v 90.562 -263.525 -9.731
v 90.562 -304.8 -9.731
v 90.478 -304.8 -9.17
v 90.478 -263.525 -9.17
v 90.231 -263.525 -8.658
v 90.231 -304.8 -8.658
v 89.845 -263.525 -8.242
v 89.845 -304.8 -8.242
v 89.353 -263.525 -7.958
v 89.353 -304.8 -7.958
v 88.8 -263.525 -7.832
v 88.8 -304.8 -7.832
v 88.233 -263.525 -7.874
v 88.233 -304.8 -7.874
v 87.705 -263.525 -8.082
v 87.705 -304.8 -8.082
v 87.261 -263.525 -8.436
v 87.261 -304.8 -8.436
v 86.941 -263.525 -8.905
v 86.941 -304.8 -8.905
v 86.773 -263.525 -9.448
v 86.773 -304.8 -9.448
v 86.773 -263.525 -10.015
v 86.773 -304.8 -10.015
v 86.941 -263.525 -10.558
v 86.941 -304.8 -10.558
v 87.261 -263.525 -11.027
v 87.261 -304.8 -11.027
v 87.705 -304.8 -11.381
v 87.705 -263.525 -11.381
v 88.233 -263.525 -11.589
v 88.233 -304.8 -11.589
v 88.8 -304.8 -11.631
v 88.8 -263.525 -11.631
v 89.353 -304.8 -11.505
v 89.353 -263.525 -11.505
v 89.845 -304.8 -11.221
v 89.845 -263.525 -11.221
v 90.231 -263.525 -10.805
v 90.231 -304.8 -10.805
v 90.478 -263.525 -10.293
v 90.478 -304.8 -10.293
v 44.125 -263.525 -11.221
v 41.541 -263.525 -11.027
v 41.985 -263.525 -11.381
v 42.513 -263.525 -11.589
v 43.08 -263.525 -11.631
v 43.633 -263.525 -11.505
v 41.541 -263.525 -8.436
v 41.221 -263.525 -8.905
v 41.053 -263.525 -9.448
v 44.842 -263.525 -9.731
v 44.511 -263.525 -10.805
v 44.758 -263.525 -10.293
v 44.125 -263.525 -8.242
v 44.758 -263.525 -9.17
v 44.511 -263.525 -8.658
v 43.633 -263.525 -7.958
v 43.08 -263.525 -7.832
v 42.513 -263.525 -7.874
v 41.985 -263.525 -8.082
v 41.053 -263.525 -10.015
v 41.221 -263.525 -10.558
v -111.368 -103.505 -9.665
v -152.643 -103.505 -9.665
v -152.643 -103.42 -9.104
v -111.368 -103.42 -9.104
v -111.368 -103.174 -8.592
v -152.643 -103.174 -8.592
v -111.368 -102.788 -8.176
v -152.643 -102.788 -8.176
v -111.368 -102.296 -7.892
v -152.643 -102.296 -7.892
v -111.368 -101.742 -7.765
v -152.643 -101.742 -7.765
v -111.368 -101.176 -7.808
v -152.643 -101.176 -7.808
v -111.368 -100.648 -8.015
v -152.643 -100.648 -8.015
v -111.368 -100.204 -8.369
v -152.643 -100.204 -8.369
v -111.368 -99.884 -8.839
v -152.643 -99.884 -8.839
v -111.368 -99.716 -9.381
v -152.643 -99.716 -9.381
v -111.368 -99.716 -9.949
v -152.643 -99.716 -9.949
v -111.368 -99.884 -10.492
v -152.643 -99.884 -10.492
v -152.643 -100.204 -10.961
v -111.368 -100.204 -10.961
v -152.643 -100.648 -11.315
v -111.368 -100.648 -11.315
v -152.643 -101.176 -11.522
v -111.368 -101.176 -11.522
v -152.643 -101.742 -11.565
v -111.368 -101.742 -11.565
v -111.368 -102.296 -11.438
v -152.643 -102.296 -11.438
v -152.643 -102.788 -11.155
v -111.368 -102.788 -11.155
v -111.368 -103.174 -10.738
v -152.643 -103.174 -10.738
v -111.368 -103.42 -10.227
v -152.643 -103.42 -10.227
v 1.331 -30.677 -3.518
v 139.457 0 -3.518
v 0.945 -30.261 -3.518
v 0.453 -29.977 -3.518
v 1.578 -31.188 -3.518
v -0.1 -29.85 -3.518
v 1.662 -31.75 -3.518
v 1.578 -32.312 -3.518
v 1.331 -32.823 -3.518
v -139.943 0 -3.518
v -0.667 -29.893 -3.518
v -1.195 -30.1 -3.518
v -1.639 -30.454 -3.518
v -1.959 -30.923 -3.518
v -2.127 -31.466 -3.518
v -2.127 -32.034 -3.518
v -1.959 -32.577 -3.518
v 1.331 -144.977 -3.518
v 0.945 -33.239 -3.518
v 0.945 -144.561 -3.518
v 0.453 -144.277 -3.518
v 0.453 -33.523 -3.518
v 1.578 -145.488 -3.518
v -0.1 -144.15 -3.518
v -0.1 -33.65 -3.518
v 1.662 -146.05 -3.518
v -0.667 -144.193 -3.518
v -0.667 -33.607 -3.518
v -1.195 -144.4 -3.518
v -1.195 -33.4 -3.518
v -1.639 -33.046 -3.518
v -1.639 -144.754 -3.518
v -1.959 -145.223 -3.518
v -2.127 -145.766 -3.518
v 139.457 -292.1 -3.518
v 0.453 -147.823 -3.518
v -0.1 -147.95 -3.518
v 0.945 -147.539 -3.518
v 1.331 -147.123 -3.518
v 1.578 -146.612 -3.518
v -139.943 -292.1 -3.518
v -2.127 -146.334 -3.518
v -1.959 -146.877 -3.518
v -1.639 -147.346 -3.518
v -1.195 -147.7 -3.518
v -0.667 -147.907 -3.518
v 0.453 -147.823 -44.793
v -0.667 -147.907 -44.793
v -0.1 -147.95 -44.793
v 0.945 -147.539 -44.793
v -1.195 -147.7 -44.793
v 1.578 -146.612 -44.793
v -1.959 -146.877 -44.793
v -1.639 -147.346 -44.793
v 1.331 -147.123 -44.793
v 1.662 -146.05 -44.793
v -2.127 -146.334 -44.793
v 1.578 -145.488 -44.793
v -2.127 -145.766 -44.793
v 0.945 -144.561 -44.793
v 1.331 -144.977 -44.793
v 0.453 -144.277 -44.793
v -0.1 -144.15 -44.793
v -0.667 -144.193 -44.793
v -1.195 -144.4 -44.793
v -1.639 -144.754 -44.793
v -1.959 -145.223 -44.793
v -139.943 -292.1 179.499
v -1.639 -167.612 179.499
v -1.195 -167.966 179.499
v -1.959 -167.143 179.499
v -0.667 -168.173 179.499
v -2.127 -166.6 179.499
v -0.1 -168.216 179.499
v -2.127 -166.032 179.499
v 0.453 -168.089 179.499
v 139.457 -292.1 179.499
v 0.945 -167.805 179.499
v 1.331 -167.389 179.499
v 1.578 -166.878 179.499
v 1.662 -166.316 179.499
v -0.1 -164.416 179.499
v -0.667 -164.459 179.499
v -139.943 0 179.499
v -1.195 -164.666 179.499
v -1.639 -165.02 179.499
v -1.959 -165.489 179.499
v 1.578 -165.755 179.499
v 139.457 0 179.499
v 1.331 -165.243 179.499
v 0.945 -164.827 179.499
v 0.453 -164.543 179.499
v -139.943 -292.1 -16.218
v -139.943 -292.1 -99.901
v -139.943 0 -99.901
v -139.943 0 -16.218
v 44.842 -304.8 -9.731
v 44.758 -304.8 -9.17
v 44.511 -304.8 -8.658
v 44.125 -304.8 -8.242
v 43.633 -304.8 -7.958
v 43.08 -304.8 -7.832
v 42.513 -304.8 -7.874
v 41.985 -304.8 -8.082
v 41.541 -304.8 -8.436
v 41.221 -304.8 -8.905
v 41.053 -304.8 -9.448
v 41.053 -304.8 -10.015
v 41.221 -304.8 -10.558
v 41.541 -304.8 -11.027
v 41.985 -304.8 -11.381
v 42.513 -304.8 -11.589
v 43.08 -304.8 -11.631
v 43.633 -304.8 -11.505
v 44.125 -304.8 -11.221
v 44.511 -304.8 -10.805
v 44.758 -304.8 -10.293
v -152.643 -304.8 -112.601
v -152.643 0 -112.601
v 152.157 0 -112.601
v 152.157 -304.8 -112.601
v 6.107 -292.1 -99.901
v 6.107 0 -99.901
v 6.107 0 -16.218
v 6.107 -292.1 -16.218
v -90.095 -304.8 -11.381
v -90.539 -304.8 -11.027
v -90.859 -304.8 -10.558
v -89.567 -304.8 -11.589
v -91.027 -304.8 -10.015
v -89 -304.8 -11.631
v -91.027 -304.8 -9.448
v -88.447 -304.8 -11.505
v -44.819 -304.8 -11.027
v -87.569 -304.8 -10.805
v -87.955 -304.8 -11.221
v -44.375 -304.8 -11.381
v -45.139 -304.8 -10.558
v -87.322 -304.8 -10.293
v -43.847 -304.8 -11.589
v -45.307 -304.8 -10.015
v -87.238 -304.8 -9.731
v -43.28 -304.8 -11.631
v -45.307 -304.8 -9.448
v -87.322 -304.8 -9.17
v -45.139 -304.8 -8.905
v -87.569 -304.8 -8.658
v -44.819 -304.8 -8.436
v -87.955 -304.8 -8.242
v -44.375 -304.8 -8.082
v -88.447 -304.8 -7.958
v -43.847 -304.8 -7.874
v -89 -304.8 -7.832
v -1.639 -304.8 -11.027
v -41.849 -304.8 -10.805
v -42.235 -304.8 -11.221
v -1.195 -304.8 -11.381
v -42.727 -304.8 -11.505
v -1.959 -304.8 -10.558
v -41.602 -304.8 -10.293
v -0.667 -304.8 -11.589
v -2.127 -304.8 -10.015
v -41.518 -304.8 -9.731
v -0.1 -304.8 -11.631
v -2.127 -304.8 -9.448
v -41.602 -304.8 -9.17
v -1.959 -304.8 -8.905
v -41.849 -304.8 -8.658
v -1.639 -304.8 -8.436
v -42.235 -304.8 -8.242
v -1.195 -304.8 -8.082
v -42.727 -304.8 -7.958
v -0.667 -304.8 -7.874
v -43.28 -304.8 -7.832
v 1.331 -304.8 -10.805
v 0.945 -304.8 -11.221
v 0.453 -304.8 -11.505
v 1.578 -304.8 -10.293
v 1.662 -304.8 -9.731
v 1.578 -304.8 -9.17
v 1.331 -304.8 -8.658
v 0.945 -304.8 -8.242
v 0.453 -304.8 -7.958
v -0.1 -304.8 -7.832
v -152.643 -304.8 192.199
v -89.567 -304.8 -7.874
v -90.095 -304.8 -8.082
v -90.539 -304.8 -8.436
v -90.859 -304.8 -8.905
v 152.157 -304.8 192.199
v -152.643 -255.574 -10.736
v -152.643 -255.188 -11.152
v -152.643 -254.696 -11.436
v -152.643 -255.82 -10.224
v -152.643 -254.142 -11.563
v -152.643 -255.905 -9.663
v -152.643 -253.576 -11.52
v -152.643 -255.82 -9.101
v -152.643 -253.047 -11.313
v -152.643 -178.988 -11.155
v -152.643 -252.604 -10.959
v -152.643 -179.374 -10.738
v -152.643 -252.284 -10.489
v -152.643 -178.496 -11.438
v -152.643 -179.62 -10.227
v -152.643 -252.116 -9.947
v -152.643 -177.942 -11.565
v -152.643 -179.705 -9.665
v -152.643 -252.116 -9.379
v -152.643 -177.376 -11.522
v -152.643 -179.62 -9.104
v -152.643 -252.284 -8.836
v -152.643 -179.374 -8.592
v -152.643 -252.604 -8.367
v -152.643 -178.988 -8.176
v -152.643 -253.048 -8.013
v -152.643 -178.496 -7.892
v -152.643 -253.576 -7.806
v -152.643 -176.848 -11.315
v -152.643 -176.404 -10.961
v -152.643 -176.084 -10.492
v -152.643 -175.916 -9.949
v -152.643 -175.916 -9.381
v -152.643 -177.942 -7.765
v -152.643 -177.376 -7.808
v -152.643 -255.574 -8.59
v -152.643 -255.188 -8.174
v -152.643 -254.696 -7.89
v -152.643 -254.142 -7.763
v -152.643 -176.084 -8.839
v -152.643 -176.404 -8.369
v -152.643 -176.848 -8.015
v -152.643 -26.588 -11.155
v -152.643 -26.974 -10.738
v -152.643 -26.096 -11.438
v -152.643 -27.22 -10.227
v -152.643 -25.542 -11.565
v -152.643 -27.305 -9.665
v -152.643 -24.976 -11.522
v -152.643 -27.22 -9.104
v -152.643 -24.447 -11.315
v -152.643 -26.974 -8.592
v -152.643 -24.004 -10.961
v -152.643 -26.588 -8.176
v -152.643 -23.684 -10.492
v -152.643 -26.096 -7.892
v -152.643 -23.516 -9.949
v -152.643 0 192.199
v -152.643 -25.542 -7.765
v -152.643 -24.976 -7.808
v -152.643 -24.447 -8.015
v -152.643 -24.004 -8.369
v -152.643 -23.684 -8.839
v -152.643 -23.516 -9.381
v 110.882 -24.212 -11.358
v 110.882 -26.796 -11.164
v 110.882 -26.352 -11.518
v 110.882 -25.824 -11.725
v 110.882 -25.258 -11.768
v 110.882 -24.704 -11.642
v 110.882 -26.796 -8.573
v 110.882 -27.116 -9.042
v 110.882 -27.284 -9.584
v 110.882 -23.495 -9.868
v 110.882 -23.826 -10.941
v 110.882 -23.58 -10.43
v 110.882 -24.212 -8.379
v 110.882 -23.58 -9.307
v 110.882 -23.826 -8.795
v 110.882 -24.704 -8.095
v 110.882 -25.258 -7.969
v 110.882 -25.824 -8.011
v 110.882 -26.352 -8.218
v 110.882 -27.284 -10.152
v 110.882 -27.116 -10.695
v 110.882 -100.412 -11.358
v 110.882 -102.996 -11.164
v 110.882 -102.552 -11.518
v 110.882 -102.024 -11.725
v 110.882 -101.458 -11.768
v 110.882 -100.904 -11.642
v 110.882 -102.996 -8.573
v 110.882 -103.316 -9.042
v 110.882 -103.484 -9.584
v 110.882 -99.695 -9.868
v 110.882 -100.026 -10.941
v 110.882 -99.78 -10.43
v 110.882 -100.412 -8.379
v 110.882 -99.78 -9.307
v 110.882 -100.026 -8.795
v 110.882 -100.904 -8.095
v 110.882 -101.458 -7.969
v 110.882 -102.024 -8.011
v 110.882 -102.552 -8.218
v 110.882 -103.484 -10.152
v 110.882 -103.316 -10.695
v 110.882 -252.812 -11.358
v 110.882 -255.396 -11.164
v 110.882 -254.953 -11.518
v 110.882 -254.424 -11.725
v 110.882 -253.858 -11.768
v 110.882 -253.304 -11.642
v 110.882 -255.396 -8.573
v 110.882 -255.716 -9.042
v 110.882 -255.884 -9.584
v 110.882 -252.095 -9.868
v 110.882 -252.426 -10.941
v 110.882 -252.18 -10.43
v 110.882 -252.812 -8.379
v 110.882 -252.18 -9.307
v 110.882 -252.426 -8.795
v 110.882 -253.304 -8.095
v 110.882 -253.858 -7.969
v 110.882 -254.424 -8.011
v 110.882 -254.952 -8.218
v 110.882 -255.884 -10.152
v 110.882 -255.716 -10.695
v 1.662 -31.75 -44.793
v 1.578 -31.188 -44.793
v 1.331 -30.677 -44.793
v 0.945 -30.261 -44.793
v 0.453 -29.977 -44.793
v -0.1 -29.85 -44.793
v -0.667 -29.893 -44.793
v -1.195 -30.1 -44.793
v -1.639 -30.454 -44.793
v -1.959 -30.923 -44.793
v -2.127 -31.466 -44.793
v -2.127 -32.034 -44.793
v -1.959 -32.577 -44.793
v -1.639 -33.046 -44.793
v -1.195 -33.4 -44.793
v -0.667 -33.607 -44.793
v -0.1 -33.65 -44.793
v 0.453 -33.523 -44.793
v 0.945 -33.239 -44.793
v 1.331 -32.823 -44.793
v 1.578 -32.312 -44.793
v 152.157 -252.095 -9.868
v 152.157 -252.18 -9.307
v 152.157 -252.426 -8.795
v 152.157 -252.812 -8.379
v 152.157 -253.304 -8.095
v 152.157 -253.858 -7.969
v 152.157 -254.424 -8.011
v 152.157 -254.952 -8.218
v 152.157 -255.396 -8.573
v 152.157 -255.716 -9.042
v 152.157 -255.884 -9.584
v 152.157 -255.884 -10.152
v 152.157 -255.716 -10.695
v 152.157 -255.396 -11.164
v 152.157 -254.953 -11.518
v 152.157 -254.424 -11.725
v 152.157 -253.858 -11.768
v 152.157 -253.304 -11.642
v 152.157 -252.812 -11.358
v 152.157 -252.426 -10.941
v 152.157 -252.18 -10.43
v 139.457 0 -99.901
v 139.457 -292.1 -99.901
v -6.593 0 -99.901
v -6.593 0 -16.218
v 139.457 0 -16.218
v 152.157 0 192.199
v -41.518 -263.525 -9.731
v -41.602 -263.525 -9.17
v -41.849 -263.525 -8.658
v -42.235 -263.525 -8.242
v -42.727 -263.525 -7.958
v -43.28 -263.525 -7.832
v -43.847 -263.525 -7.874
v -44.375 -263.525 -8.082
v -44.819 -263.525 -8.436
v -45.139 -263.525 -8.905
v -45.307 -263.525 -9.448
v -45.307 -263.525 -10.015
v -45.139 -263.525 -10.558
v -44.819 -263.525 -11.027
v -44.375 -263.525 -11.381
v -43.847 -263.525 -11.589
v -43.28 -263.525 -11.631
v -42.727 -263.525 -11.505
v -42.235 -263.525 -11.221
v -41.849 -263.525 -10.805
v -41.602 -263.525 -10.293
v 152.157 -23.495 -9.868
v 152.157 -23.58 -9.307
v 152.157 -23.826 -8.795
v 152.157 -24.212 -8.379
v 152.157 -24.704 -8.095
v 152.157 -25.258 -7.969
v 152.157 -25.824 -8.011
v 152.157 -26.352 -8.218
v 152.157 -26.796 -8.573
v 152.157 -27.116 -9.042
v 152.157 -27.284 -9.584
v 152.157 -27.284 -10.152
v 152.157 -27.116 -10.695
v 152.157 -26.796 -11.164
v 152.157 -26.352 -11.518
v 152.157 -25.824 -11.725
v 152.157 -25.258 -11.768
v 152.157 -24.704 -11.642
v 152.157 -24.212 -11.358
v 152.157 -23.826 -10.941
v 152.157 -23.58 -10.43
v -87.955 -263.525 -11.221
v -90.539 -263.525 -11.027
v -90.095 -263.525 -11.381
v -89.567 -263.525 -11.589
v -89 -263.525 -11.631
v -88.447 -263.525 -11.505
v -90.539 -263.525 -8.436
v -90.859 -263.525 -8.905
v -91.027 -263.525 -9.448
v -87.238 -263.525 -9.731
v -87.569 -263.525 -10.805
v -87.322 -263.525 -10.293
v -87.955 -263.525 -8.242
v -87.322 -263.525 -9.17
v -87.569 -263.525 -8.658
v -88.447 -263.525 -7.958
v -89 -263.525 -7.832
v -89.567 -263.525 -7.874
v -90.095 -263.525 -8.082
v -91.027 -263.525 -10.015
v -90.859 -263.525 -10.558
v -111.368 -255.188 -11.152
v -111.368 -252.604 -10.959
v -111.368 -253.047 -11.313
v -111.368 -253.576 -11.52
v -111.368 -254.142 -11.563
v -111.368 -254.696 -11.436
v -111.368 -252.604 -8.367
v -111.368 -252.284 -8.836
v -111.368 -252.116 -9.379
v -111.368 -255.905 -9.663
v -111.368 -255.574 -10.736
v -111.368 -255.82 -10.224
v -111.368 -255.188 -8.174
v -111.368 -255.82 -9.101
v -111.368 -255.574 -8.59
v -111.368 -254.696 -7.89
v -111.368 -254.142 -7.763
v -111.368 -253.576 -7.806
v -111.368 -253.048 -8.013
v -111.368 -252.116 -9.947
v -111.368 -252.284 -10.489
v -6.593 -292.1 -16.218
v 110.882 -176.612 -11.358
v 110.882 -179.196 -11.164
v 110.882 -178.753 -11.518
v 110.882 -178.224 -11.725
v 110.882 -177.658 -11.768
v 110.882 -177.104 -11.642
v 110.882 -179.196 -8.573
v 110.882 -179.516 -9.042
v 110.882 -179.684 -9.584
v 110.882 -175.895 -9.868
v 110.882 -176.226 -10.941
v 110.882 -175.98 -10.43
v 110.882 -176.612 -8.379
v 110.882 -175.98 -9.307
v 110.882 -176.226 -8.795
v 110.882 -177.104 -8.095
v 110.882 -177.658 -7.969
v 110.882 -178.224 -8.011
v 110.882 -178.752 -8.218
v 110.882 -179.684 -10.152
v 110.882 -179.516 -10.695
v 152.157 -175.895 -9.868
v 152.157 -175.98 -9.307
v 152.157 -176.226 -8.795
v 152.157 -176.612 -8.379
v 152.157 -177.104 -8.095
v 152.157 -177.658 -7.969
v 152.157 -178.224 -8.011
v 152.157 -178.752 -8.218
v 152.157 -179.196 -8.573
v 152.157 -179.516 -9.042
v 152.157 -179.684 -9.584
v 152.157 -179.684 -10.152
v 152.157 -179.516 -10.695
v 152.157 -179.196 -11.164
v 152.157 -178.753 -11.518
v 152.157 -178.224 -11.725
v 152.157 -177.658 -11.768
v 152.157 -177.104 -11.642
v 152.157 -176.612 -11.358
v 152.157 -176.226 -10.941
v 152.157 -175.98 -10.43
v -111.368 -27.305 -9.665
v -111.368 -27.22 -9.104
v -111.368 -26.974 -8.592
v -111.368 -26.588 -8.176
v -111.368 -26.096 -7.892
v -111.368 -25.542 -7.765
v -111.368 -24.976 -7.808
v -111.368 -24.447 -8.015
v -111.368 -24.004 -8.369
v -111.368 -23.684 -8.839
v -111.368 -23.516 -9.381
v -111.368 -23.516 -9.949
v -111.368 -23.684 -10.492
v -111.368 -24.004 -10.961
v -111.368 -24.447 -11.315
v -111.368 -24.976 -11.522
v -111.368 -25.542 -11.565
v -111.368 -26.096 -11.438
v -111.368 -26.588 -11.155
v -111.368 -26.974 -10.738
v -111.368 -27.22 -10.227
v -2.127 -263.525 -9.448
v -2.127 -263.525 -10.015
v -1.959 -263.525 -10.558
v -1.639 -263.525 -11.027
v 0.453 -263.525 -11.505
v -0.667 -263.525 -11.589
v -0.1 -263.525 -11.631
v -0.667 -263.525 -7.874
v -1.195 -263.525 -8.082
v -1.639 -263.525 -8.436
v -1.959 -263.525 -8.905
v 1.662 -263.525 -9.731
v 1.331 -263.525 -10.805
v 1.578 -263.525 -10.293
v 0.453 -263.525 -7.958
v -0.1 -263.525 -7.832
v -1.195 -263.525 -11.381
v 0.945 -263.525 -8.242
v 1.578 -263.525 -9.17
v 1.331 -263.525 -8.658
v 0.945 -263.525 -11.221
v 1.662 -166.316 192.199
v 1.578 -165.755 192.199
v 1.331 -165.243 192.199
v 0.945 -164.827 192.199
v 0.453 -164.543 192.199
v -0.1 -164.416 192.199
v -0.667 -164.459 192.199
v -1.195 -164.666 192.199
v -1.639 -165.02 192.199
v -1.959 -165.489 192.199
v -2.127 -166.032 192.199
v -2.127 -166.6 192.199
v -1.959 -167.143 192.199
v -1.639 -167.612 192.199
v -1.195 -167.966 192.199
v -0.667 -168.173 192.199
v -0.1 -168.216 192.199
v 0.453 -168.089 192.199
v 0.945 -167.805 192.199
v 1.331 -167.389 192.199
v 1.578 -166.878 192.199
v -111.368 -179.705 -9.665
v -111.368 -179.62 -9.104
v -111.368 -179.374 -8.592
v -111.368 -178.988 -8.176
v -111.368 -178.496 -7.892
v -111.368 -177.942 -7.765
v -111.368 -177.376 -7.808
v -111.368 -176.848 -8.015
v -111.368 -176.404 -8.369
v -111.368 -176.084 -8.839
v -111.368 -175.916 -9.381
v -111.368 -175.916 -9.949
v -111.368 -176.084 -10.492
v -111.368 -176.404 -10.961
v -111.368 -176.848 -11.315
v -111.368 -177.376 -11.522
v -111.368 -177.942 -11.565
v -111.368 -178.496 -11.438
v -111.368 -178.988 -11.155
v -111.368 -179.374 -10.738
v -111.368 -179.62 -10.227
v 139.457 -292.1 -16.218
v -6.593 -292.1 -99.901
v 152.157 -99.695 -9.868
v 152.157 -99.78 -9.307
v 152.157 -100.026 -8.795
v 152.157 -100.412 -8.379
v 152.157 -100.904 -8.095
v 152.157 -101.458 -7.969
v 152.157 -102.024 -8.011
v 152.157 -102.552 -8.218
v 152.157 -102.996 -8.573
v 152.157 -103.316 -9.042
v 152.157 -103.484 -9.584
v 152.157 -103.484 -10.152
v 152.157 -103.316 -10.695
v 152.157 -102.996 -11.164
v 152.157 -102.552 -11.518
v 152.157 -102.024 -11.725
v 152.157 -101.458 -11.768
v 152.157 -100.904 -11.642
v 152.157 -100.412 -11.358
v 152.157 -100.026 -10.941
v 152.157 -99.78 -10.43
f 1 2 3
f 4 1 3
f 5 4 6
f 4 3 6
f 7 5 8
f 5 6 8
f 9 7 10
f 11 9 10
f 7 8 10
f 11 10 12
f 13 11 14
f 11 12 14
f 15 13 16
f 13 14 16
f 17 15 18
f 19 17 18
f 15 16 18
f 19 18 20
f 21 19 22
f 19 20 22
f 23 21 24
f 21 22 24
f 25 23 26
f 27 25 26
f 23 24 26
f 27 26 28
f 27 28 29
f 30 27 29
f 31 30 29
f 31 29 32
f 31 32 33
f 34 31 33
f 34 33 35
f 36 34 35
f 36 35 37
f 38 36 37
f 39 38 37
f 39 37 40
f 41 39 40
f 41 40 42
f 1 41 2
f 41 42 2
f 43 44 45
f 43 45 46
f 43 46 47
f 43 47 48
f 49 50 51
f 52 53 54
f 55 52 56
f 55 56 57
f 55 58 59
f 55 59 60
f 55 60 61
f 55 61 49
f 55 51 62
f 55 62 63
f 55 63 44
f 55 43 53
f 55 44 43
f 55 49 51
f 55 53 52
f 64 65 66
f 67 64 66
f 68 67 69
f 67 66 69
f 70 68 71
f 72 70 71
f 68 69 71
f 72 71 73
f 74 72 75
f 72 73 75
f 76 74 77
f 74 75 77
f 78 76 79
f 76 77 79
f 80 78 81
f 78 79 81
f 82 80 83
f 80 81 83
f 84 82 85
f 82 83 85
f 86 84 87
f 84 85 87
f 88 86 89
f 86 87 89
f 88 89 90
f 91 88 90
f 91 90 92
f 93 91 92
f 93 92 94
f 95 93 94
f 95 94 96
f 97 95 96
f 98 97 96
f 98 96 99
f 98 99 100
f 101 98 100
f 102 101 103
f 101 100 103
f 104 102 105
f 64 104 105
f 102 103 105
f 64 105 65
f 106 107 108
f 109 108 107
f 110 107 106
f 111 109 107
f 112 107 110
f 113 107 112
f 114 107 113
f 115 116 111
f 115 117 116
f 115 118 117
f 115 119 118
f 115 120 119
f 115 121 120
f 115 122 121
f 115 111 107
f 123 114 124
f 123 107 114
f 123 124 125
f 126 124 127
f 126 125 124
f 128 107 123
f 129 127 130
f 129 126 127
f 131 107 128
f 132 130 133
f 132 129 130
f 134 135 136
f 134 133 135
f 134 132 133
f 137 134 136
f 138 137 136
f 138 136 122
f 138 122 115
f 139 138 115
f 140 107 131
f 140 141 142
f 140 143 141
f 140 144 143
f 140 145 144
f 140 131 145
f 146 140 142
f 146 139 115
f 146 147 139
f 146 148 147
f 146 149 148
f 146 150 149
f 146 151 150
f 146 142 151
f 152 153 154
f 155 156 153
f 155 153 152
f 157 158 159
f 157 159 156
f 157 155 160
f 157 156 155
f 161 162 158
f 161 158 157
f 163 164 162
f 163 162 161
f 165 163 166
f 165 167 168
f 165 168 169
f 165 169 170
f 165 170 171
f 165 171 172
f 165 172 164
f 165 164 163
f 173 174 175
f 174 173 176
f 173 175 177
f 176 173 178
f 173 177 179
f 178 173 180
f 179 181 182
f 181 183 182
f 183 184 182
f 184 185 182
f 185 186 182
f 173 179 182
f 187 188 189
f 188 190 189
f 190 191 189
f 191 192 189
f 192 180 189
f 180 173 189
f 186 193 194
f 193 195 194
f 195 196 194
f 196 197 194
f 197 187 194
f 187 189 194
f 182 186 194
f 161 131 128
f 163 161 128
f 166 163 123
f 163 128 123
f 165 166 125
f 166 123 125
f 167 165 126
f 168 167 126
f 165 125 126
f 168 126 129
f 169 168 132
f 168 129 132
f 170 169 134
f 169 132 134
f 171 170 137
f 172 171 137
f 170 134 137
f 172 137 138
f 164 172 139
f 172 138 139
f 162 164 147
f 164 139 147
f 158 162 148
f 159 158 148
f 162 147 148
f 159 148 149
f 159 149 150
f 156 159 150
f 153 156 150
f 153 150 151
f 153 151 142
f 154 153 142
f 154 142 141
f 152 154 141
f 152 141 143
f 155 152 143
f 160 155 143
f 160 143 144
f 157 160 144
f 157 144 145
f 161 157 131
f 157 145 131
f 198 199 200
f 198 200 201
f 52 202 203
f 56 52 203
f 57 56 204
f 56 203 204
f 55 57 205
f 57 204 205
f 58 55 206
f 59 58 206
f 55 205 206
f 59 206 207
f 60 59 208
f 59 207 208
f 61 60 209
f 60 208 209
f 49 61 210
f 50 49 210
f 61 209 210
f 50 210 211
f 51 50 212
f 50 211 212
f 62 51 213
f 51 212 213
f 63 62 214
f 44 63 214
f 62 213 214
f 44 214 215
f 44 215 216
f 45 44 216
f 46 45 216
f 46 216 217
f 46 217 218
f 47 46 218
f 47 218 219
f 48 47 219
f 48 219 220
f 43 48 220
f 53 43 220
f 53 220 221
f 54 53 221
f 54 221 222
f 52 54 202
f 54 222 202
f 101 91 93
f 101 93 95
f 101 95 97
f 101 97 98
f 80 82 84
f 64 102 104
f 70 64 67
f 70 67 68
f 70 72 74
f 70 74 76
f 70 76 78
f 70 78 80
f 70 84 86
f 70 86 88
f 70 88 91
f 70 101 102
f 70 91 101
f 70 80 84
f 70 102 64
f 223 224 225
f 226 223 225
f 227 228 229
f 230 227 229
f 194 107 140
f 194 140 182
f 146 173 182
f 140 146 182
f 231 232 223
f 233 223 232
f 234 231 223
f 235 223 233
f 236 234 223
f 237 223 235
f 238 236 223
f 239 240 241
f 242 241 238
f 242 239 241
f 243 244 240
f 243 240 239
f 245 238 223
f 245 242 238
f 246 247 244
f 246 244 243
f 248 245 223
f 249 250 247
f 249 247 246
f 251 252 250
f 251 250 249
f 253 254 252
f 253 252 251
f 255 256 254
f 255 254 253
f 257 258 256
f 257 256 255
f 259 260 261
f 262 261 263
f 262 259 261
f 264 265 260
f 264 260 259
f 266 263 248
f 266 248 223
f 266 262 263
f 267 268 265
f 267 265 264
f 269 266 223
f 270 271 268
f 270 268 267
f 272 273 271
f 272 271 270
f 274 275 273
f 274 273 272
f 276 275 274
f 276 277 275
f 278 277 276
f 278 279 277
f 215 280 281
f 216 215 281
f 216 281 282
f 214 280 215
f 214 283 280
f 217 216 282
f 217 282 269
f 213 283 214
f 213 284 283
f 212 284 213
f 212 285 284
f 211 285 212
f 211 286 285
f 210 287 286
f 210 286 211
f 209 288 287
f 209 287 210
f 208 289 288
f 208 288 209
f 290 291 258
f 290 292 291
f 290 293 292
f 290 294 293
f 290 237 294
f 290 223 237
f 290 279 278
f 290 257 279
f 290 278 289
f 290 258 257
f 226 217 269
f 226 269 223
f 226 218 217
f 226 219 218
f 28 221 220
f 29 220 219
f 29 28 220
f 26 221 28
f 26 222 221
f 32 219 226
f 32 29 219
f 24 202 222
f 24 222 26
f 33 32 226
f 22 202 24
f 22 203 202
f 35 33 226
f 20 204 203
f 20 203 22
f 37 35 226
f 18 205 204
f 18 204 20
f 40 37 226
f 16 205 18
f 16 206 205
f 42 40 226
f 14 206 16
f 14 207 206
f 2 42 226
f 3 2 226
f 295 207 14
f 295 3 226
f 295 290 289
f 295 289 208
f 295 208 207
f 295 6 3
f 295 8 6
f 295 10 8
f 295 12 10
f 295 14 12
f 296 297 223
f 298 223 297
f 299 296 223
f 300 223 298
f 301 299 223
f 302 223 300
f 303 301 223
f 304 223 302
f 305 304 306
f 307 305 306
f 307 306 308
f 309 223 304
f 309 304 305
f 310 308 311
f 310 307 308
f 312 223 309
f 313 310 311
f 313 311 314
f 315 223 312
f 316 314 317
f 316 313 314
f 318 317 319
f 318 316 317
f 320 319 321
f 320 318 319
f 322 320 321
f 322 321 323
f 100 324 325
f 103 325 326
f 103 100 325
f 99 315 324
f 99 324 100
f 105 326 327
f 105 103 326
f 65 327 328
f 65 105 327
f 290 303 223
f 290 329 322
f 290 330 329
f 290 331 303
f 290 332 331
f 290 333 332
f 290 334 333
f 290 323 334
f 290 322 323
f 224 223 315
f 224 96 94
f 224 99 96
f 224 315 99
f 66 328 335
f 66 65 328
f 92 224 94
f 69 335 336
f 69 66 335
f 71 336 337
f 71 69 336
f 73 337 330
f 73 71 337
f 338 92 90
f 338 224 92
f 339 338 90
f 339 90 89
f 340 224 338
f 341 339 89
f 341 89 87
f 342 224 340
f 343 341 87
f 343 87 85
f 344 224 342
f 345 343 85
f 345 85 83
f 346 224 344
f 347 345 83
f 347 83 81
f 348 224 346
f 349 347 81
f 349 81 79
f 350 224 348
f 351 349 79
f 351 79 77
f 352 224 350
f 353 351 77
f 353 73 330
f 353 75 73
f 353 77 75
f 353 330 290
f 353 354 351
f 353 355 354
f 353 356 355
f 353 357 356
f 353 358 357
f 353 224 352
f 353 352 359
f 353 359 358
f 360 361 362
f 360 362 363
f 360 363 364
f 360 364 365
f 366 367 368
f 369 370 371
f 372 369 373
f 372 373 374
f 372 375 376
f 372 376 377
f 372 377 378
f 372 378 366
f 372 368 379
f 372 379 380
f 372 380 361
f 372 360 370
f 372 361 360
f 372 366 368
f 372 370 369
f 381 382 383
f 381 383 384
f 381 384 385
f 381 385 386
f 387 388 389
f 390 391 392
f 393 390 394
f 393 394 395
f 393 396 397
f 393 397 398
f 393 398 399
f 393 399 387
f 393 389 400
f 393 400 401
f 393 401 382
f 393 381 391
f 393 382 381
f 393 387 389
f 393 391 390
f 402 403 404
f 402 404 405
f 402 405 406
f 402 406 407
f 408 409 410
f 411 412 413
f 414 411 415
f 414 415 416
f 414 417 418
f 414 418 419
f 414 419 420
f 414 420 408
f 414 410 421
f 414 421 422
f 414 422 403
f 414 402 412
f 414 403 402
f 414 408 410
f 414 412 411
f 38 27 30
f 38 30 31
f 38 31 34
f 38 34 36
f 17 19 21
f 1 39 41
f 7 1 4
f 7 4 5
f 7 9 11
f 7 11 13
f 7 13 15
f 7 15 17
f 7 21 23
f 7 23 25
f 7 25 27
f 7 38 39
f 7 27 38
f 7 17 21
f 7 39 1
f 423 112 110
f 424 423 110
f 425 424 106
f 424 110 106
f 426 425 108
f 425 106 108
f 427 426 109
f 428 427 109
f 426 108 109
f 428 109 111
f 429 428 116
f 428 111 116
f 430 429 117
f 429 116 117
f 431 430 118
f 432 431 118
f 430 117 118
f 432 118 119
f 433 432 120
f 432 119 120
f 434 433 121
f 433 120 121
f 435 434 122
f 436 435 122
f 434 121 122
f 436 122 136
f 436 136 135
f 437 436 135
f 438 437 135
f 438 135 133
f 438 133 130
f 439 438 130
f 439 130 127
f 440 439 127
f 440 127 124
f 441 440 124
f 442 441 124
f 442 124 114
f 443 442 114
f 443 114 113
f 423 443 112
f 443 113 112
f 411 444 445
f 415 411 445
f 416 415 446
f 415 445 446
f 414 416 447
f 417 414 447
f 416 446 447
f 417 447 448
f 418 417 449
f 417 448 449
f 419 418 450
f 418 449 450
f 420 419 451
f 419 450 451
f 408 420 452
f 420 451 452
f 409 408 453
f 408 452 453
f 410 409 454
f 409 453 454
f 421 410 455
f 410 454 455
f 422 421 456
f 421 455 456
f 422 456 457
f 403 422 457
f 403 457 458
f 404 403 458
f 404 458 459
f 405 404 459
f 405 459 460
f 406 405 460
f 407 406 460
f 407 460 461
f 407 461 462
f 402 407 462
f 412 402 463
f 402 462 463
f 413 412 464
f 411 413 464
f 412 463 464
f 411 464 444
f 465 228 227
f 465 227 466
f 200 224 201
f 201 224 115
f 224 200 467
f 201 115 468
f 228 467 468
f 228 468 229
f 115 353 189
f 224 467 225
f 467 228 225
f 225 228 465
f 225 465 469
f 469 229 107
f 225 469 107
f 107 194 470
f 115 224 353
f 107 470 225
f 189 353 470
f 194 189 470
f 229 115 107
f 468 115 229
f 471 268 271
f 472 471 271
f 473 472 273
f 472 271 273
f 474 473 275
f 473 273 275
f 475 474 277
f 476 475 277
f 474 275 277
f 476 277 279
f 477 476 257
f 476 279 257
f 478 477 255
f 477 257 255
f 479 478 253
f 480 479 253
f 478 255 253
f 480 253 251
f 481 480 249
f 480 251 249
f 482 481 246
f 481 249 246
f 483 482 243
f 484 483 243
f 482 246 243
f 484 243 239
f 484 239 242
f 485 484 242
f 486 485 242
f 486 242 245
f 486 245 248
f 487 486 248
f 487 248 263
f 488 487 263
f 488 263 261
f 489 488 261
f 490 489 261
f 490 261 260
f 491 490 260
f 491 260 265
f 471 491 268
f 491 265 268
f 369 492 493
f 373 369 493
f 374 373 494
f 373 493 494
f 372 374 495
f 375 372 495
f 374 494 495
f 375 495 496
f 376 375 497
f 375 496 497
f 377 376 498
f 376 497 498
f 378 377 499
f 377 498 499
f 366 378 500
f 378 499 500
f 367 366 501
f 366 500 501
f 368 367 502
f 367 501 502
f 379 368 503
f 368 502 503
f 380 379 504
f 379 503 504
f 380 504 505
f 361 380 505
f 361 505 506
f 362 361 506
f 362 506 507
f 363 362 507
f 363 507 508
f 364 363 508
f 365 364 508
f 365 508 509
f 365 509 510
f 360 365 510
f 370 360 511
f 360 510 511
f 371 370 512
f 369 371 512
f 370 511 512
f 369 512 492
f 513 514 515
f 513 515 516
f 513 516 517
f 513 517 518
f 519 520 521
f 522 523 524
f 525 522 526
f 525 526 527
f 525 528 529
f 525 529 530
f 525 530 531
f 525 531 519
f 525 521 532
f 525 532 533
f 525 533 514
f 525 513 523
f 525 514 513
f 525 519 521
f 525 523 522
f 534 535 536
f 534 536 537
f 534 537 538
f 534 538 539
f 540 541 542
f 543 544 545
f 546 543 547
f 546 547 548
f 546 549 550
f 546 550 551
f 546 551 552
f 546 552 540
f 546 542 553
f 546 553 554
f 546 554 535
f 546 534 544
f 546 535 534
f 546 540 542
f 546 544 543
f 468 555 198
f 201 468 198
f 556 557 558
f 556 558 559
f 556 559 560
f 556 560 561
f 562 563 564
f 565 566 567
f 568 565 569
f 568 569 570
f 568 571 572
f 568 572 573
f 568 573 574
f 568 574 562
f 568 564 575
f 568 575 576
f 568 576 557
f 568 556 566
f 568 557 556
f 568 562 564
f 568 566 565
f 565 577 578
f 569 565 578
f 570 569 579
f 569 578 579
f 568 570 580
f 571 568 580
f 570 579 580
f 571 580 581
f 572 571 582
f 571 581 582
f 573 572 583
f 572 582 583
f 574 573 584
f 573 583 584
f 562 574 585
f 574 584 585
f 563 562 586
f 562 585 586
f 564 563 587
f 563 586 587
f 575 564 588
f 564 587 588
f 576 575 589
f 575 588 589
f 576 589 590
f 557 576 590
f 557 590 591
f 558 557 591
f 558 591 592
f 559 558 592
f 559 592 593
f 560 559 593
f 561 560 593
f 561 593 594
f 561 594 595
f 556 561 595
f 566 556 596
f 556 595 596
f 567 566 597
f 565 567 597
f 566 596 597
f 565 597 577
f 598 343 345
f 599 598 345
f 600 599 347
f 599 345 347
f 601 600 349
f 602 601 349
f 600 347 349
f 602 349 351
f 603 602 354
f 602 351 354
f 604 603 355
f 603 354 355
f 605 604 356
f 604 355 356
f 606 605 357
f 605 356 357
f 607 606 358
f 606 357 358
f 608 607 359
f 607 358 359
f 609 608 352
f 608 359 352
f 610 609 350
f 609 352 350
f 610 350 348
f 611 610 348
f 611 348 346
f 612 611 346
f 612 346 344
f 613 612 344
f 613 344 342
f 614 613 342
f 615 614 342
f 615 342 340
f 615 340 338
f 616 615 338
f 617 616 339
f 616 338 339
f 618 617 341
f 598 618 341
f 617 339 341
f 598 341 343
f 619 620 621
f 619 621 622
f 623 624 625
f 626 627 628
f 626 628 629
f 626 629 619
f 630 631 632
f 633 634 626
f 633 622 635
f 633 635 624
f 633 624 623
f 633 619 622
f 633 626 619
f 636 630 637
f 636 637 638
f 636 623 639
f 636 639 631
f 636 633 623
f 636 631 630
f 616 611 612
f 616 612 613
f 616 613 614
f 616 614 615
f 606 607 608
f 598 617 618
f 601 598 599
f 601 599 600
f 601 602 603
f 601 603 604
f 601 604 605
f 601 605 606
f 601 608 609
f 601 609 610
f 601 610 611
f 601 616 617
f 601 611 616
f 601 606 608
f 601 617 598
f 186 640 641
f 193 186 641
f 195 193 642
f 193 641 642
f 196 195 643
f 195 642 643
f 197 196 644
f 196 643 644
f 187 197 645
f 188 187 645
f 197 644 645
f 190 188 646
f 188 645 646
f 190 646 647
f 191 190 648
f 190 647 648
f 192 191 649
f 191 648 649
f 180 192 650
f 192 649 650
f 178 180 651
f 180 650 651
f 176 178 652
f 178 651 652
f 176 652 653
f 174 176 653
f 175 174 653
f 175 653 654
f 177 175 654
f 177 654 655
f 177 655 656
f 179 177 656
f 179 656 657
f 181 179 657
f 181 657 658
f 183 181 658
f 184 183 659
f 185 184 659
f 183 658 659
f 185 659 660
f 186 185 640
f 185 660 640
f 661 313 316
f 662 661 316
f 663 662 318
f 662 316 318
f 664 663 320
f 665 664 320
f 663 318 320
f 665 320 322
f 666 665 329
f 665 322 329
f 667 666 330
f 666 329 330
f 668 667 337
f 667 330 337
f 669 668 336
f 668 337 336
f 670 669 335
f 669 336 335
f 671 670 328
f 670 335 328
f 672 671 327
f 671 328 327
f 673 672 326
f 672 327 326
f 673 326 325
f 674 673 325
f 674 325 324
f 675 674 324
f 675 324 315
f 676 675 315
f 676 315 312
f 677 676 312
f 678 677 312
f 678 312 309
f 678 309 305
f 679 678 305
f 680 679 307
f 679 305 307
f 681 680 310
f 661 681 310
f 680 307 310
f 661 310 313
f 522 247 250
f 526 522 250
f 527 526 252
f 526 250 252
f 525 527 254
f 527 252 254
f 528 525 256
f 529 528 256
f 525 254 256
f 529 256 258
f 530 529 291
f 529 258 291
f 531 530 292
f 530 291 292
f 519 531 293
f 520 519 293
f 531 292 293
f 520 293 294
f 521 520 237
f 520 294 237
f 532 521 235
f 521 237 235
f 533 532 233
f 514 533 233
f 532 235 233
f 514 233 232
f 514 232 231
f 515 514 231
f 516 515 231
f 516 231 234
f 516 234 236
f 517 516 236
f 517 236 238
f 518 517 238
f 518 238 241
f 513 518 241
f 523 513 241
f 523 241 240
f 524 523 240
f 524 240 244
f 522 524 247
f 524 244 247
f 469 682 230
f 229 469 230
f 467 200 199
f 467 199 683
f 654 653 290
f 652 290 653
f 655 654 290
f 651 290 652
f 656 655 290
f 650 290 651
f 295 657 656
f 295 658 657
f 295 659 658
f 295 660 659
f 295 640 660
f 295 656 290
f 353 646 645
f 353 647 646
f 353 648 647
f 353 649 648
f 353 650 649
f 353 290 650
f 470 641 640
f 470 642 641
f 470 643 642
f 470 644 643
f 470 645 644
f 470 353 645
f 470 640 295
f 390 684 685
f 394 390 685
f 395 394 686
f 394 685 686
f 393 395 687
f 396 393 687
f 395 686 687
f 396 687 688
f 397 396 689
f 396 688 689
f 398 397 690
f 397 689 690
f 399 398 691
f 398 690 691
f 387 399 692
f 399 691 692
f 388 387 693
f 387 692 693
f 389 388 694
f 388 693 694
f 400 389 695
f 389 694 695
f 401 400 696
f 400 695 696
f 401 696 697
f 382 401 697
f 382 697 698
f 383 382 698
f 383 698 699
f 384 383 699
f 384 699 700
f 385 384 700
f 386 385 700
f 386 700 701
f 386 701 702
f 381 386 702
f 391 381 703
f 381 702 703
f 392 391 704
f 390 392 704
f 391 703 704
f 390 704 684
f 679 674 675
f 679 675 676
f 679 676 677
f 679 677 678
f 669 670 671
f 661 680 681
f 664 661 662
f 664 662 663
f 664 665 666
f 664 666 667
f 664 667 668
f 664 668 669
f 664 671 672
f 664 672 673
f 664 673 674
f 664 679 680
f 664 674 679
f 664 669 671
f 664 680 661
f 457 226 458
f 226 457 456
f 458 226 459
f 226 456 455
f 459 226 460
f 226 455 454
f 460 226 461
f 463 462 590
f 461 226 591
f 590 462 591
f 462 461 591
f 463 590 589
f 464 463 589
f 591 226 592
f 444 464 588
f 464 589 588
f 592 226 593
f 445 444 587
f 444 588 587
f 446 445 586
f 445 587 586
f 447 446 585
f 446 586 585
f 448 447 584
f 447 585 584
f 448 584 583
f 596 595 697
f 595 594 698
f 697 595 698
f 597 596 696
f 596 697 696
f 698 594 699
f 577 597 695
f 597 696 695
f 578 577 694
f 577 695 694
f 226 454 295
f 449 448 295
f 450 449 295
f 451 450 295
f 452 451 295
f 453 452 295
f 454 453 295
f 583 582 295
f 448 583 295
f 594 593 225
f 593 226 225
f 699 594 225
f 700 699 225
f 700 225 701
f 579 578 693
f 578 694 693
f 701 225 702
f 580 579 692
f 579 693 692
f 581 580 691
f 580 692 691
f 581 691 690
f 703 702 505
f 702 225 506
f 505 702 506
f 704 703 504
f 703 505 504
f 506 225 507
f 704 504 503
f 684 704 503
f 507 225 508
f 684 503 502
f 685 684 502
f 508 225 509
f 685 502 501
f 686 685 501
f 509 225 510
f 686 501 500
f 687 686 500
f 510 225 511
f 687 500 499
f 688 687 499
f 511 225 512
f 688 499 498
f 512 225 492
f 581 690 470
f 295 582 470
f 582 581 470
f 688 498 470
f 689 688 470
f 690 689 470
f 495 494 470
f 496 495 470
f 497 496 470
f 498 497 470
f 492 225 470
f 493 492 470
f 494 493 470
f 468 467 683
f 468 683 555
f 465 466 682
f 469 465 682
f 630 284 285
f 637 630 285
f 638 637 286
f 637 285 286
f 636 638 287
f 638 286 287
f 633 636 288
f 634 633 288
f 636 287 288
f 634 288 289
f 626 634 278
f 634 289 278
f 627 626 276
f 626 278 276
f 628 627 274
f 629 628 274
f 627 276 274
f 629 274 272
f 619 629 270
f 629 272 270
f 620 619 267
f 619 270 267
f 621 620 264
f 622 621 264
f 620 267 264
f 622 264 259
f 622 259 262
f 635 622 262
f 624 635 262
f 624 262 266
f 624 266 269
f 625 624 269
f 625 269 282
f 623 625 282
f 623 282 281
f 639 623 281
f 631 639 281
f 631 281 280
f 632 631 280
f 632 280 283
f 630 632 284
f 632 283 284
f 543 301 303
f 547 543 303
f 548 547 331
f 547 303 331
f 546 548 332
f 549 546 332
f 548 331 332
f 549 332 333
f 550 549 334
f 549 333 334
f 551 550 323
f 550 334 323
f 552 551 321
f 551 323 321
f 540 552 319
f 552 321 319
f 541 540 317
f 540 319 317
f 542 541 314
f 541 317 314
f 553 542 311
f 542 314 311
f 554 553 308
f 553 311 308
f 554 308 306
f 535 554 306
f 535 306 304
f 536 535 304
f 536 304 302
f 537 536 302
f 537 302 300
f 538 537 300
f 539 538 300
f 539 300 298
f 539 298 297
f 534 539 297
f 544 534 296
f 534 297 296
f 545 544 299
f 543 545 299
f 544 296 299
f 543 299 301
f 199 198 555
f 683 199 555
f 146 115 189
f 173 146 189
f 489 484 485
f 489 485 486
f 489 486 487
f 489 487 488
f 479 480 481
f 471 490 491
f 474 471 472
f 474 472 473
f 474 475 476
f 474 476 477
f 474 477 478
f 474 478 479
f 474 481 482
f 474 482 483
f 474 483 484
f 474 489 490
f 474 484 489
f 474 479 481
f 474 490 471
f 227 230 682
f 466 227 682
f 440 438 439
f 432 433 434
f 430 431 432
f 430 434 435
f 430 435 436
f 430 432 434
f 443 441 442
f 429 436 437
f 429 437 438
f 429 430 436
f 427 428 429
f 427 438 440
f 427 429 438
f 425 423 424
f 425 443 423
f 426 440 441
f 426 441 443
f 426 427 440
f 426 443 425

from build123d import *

# Parameters (mm, degrees)
F0_W      = 304.8
F0_H      = 304.8
F1_DEPTH  = 304.8
F2_T      = -12.7
F3_W      = 279.4
F3_H      = 12.7
F4_DEPTH  = 292.1
F5_R      = 1.905
F6_DEPTH  = 12.7
F7_R      = 1.905
F8_DEPTH  = 41.275
F9_R      = 1.905
F10_DEPTH = 41.275
F11_R     = 1.905
F12_DEPTH = 41.275
F13_W     = 12.7
F13_H     = 83.6831671771
F14_DEPTH = 292.1
F15_R     = 1.905
F16_DEPTH = 41.275


with BuildPart() as f1:
    # F0 (on Front) → F1 (new body)
    with BuildSketch(Plane.XZ):
        with Locations((-0.2428255975, 39.7985728923)):
            Rectangle(F0_W, F0_H)
    extrude(amount=F1_DEPTH)

    # F2
    f2_openings = [f1.faces().sort_by_distance(p)[0] for p in [
        (-0.242826, 0, 39.798573),
    ]]
    offset(amount=F2_T, openings=f2_openings)

    # F3 (on face) → F4 (join)
    with BuildSketch(Plane(origin=(0, -292.1, 0), x_dir=(-1, 0, 0), z_dir=(0, 1, 0))):
        with Locations((0.2428255975, -9.8682599306)):
            Rectangle(F3_W, F3_H)
    extrude(amount=F4_DEPTH)

    # F5 (on face) → F6 (cut, symmetric)
    with BuildSketch(Plane.XY.offset(192.1985728923)):
        with Locations((-0.2428255975, -166.3160324097)):
            Circle(F5_R)
    extrude(amount=F6_DEPTH, both=True, mode=Mode.SUBTRACT)

    # F7 (on face) → F8 (cut)
    with BuildSketch(Plane.YZ.offset(152.1571744025)):
        with Locations((-254, -9.8682599306)):
            Circle(F7_R)
        with Locations((-177.8, -9.8682599306)):
            Circle(F7_R)
        with Locations((-101.6, -9.8682599306)):
            Circle(F7_R)
        with Locations((-25.4, -9.8682599306)):
            Circle(F7_R)
    extrude(amount=-F8_DEPTH, mode=Mode.SUBTRACT)

    # F9 (on face) → F10 (cut)
    with BuildSketch(Plane(origin=(-152.6428255975, 0, 0), x_dir=(0, -1, 0), z_dir=(-1, 0, 0))):
        with Locations((25.4, -9.6651343237)):
            Circle(F9_R)
        with Locations((101.6, -9.6651343237)):
            Circle(F9_R)
        with Locations((177.8, -9.6651343237)):
            Circle(F9_R)
        with Locations((254, -9.6629047766)):
            Circle(F9_R)
    extrude(amount=-F10_DEPTH, mode=Mode.SUBTRACT)

    # F11 (on face) → F12 (cut)
    with BuildSketch(Plane.XZ.offset(304.8)):
        with Locations((-89.1428255975, -9.7314271077)):
            Circle(F11_R)
        with Locations((-43.4228255975, -9.7314271077)):
            Circle(F11_R)
        with Locations((-0.2428255975, -9.7314271077)):
            Circle(F11_R)
        with Locations((42.9371744025, -9.7314271077)):
            Circle(F11_R)
        with Locations((88.6571744025, -9.7314271077)):
            Circle(F11_R)
    extrude(amount=-F12_DEPTH, mode=Mode.SUBTRACT)

    # F13 (on face) → F14 (join)
    with BuildSketch(Plane(origin=(0, -292.1, 0), x_dir=(-1, 0, 0), z_dir=(0, 1, 0))):
        with Locations((0.2428255975, -58.0598435192)):
            Rectangle(F13_W, F13_H)
    extrude(amount=F14_DEPTH)

    # F15 (on face) → F16 (cut)
    with BuildSketch(Plane.XY.offset(-3.5182599306)):
        with Locations((-0.2428255975, -31.75)):
            Circle(F15_R)
        with Locations((-0.2428255975, -146.05)):
            Circle(F15_R)
    extrude(amount=-F16_DEPTH, mode=Mode.SUBTRACT)


solid = f1.part
